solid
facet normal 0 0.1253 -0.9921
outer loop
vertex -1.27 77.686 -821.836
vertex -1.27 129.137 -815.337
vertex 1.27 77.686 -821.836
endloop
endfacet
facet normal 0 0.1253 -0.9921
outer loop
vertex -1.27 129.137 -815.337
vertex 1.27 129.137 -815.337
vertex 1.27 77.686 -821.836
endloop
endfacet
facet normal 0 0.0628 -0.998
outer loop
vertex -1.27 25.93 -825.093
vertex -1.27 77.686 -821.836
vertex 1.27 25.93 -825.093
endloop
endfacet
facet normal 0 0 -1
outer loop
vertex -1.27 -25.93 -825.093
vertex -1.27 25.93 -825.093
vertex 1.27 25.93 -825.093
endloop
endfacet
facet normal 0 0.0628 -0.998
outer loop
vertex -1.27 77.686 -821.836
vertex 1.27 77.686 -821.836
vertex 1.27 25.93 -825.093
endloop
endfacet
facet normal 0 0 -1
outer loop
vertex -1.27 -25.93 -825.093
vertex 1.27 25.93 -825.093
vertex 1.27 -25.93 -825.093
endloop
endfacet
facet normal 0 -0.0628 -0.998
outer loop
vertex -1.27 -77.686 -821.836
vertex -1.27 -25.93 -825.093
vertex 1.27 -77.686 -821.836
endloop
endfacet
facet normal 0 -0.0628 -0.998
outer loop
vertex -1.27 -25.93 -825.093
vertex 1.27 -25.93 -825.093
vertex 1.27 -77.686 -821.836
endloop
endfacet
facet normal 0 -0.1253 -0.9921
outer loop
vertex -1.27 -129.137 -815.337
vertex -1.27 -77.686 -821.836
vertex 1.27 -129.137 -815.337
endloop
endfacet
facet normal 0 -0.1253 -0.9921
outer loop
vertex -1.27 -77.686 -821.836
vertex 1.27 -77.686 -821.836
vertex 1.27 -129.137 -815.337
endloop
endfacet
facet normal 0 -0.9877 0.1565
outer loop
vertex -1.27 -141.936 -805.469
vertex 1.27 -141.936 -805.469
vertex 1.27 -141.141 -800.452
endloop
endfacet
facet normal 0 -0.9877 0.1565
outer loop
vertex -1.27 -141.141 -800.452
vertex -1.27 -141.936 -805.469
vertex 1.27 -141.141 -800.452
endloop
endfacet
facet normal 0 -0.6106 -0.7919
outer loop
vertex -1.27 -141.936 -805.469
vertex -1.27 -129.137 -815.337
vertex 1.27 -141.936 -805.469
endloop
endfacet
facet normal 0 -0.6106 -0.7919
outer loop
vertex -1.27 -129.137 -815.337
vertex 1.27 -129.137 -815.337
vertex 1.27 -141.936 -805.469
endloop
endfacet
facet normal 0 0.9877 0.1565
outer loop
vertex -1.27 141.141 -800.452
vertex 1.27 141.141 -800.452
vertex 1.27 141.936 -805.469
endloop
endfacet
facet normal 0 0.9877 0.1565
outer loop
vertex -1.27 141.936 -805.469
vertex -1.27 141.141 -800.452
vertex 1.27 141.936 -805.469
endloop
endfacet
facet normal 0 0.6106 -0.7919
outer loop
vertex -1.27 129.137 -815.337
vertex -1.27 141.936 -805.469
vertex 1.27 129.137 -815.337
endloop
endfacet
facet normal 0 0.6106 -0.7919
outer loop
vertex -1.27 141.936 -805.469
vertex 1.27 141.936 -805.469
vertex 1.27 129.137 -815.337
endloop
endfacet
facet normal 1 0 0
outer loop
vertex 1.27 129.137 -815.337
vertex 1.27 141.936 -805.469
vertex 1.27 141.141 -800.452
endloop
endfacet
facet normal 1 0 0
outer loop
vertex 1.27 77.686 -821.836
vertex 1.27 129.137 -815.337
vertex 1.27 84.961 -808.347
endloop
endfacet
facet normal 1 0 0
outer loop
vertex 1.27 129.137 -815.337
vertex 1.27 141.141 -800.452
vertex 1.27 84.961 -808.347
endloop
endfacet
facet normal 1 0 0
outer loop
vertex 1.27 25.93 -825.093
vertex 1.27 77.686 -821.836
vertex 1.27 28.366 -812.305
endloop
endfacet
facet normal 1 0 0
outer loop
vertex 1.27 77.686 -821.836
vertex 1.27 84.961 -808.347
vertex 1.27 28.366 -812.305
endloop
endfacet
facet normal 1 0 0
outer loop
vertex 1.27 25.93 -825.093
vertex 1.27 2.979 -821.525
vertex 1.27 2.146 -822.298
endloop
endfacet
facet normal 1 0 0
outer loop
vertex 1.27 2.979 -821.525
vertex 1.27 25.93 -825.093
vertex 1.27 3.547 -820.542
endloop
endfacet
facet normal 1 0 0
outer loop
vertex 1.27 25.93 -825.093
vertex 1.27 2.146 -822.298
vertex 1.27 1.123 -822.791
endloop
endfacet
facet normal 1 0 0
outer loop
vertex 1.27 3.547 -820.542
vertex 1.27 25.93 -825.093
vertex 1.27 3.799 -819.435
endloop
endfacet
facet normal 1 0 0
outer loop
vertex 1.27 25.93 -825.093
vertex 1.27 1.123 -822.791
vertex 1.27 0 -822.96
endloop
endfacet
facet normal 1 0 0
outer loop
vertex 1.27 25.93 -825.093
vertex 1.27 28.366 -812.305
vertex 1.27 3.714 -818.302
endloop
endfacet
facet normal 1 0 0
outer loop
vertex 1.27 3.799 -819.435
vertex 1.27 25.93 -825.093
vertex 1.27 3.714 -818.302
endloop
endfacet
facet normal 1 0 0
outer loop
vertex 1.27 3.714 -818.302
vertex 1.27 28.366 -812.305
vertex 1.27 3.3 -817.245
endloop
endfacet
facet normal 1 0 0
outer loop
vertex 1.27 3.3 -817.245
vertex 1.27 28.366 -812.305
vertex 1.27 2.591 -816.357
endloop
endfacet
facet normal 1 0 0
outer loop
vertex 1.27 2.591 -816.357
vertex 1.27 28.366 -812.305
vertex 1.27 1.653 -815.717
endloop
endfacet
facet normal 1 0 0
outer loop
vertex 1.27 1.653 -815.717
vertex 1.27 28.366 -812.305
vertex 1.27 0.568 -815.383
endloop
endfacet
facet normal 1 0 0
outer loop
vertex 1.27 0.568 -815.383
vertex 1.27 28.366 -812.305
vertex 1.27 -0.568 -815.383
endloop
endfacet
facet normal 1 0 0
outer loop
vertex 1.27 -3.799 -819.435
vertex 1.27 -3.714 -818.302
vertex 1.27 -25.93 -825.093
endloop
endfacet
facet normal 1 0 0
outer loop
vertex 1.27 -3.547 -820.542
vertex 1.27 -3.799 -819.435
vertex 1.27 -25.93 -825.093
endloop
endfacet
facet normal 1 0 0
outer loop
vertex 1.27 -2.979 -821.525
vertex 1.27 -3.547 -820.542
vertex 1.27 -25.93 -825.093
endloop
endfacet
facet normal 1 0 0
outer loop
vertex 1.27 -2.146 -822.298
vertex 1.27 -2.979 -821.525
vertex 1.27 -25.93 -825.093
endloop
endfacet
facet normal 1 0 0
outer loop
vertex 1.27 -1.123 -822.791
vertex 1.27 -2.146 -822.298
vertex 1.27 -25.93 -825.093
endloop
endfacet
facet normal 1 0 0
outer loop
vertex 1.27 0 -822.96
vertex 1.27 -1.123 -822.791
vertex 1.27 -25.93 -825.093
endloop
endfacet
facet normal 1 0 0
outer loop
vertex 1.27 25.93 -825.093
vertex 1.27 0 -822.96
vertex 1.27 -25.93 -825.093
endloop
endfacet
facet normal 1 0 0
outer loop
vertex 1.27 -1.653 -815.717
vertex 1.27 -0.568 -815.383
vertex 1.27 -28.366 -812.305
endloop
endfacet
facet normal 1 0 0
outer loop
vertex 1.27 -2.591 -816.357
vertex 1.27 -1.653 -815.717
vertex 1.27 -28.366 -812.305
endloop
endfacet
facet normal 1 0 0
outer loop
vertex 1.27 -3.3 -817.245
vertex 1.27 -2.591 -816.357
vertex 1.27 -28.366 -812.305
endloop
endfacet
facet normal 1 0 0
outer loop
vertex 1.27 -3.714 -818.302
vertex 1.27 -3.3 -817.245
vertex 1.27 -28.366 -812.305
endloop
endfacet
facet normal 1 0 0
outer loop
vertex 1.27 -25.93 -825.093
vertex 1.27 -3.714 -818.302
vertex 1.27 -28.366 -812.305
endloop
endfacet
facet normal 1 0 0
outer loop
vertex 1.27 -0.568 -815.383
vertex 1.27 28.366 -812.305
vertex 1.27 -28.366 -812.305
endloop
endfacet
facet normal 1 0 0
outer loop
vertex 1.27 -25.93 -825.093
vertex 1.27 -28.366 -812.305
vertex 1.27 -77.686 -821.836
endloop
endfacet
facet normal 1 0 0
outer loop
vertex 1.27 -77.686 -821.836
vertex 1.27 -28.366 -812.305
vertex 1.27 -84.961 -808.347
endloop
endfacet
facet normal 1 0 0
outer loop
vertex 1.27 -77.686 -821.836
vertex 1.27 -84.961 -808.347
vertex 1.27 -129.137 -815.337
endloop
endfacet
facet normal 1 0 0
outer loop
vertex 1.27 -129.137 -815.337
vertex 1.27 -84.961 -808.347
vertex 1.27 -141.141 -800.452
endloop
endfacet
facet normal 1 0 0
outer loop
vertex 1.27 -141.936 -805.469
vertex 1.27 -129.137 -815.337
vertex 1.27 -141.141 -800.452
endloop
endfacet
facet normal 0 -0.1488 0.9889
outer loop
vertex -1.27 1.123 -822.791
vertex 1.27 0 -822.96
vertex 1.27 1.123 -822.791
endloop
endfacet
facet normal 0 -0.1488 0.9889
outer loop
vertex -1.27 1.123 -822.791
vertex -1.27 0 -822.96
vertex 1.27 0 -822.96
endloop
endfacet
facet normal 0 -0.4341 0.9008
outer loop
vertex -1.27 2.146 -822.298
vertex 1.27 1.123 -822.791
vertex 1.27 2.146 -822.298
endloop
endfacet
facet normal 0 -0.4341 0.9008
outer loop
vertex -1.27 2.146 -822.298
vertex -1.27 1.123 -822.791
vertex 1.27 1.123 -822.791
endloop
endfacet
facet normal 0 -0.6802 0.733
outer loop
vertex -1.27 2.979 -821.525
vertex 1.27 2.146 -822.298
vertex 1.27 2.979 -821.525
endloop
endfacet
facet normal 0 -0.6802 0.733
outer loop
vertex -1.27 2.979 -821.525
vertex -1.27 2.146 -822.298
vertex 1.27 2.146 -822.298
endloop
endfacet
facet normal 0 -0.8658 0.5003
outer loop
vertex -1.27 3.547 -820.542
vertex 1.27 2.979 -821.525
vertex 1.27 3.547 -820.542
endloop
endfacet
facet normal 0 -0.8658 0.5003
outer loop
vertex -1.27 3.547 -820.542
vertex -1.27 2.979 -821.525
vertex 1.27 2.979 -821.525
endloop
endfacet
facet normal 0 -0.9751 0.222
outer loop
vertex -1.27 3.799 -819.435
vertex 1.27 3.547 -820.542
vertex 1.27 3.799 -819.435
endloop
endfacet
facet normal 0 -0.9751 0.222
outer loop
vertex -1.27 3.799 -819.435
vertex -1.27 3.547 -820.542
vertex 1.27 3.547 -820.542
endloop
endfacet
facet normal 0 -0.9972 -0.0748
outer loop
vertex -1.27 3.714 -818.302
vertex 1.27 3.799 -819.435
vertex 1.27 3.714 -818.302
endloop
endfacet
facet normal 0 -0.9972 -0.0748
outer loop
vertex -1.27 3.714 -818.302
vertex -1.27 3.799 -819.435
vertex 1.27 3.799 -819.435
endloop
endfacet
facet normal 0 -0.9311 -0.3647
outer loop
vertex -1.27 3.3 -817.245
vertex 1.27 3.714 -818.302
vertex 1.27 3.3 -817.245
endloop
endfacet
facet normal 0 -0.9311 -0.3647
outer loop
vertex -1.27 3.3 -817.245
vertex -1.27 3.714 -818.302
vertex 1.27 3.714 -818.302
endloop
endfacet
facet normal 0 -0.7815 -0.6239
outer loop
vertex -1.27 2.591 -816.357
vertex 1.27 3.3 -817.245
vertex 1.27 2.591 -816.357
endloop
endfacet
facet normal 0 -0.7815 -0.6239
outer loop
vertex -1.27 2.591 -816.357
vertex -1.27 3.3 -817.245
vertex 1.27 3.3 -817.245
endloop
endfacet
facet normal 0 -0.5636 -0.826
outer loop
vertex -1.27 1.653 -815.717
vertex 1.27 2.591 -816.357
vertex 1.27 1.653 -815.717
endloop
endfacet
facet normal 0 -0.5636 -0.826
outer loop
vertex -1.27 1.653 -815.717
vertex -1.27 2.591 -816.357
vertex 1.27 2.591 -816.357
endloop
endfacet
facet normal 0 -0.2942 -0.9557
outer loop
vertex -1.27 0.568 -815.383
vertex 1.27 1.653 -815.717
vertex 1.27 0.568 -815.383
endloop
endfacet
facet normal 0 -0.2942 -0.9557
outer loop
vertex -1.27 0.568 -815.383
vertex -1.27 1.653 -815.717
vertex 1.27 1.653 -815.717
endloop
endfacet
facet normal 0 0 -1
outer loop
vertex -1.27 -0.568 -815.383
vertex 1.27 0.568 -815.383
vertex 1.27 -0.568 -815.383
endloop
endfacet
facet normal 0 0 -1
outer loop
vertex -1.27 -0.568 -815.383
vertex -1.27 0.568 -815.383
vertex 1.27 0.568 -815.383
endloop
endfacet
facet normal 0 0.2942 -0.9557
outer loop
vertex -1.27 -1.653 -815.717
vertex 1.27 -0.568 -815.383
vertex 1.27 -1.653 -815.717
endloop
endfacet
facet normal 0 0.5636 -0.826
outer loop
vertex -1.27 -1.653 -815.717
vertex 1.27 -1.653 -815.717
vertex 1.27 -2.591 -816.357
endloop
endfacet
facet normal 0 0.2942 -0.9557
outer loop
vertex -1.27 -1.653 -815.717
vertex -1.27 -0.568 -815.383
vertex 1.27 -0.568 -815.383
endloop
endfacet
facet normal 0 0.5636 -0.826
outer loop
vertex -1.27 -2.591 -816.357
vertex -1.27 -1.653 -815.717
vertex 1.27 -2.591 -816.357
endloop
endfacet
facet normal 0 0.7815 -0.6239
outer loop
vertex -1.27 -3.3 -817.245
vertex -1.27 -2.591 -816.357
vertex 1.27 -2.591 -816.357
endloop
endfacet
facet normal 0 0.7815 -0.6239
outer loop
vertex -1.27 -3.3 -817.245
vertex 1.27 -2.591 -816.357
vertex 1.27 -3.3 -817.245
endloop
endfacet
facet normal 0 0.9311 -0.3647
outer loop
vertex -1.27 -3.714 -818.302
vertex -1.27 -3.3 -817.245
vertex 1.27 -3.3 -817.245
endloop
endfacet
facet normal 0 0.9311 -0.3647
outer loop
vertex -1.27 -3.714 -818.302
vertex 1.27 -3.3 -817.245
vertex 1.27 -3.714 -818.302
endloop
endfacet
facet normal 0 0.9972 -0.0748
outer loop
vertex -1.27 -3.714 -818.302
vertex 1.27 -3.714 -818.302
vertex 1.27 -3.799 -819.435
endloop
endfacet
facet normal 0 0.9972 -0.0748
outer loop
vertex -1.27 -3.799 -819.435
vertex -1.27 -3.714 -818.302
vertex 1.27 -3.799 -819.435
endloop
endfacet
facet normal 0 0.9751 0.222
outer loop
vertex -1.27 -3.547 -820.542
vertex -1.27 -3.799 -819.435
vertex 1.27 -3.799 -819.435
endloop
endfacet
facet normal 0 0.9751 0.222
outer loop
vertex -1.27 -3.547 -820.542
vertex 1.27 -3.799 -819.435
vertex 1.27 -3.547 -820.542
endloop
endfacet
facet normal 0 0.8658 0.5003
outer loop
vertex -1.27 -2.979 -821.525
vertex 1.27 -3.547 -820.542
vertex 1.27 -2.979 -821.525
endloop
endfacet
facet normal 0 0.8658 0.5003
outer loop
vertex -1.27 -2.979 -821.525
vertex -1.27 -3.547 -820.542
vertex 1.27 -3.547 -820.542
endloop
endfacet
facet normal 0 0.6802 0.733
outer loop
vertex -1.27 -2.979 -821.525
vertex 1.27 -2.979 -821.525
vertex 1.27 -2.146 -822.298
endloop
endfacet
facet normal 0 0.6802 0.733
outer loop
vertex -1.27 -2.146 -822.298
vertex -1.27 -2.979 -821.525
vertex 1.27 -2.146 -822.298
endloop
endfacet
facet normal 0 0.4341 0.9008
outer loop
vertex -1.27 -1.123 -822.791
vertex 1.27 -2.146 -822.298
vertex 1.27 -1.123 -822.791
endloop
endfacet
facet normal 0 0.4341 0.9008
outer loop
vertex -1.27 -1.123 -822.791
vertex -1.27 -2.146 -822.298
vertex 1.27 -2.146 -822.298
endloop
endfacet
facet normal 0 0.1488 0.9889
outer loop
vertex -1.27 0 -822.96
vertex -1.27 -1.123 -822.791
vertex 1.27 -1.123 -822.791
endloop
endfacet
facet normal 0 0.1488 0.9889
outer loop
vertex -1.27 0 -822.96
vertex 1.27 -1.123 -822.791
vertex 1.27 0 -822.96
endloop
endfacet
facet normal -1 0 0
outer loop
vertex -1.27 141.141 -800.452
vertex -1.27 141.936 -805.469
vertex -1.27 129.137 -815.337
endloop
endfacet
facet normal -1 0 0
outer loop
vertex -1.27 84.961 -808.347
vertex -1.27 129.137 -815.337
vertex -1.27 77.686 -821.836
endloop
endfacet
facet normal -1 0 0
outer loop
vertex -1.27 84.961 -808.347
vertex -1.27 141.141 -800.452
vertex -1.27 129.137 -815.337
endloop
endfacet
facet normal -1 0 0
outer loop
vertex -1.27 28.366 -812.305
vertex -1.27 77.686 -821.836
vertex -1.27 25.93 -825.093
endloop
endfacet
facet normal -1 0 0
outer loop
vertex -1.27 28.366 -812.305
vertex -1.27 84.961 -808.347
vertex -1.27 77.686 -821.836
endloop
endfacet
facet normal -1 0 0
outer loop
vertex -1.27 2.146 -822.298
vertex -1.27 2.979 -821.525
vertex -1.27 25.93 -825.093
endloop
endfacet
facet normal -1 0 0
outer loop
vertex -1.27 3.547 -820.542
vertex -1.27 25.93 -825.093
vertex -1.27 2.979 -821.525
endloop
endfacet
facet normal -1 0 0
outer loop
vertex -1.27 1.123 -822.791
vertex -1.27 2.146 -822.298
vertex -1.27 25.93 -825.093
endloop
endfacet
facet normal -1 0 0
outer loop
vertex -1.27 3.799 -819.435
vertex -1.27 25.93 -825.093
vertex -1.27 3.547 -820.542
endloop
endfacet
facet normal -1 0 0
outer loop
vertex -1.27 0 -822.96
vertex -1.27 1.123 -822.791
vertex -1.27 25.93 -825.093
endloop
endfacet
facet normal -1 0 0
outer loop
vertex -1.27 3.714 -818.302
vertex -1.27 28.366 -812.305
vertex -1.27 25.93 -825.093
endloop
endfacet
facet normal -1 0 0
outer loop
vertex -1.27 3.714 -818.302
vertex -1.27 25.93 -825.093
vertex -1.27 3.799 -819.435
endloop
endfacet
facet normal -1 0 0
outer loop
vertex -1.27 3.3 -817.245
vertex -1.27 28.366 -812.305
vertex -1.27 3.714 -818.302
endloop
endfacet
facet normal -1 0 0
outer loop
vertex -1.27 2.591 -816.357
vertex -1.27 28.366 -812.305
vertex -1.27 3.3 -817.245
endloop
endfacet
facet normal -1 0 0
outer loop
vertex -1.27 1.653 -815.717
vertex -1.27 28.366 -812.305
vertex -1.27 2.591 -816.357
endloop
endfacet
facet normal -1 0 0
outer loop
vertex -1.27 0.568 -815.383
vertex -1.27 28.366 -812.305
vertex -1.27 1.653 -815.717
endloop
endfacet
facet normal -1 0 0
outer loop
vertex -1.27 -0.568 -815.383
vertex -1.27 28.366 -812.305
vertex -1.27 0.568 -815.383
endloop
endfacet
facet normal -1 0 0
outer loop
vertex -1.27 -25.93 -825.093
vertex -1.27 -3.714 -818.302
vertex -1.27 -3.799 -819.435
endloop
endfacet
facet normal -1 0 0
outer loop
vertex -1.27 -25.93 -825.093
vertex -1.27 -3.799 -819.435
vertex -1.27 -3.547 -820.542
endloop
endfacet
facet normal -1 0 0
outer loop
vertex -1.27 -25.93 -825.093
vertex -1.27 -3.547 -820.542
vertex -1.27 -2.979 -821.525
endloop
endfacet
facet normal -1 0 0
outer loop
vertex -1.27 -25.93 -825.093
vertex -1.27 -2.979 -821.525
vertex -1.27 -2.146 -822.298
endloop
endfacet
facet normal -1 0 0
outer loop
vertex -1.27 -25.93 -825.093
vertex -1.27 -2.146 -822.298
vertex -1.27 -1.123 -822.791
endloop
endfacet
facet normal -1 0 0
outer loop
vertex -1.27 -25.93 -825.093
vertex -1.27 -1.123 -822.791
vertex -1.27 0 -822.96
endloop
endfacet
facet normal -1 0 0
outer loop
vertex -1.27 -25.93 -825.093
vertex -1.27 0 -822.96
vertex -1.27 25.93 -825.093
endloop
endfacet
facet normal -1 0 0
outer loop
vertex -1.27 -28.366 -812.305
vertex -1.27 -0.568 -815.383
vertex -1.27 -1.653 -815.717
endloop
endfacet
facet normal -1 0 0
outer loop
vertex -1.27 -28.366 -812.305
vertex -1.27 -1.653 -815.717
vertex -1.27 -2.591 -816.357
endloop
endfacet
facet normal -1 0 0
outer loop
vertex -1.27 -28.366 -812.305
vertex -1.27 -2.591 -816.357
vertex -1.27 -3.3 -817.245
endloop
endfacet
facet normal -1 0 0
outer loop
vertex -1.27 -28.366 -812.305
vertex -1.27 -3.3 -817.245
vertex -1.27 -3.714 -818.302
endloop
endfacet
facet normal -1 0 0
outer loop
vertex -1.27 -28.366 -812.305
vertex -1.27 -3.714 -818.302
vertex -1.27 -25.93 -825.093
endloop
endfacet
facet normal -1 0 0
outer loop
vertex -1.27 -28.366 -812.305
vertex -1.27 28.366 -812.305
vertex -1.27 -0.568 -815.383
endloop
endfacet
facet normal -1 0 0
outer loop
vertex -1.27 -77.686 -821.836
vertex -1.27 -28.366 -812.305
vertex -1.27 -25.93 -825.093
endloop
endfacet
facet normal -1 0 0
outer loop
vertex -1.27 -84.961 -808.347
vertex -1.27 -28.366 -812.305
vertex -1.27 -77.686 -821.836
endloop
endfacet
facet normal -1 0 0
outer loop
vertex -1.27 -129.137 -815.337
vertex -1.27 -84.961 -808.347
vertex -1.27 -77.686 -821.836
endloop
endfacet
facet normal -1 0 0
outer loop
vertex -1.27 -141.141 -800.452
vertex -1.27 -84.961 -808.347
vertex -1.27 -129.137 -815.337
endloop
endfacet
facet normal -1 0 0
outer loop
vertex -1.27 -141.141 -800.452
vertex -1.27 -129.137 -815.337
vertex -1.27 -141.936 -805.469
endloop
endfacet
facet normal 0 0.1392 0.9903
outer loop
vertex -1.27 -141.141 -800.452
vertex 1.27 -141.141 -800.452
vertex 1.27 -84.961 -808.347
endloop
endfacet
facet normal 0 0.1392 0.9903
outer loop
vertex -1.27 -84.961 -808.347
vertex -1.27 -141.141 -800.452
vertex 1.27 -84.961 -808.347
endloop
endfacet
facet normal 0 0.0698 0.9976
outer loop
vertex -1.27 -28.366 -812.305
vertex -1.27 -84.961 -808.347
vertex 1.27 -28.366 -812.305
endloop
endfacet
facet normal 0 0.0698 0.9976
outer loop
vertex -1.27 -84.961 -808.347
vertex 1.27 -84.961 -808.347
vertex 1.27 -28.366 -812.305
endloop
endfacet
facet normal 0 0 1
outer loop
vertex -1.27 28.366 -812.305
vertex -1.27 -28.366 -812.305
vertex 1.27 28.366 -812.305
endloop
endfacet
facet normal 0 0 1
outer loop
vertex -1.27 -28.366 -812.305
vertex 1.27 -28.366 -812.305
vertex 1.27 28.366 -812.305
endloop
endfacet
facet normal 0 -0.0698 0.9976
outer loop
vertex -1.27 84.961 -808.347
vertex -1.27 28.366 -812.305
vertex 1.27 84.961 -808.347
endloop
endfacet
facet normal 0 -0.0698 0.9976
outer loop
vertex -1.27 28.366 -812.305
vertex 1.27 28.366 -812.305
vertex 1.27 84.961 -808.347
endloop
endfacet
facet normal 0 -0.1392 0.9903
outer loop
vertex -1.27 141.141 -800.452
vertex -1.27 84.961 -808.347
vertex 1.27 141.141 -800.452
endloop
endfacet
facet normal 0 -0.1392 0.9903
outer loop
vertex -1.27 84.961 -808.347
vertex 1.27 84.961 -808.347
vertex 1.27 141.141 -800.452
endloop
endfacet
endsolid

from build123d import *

# Parameters (mm, degrees)
SKETCH1_R           = 3.81
BOSS_EXTRUDE1_DEPTH = 1.27


with BuildPart() as part:
    # Sketch1 → Boss-Extrude1 (new, symmetric)
    with BuildSketch(Plane.YZ):
        with BuildLine():
            Line((141.141238808, -800.451741648), (141.93592589, -805.469198419))
            Line((141.93592589, -805.469198419), (129.136650891, -815.336725161))
            ThreePointArc((129.136650891, -815.336725161), (0, -825.5), (-129.136650891, -815.336725161))
            Line((-129.136650891, -815.336725161), (-141.93592589, -805.469198419))
            Line((-141.93592589, -805.469198419), (-141.141238808, -800.451741648))
            ThreePointArc((-141.141238808, -800.451741648), (0, -812.8), (141.141238808, -800.451741648))
        make_face()
        with Locations(Location((0, -819.15, 0), (0, 0, 270))):
            Circle(SKETCH1_R, mode=Mode.SUBTRACT)
    extrude(amount=BOSS_EXTRUDE1_DEPTH, both=True)


solid = part.part
